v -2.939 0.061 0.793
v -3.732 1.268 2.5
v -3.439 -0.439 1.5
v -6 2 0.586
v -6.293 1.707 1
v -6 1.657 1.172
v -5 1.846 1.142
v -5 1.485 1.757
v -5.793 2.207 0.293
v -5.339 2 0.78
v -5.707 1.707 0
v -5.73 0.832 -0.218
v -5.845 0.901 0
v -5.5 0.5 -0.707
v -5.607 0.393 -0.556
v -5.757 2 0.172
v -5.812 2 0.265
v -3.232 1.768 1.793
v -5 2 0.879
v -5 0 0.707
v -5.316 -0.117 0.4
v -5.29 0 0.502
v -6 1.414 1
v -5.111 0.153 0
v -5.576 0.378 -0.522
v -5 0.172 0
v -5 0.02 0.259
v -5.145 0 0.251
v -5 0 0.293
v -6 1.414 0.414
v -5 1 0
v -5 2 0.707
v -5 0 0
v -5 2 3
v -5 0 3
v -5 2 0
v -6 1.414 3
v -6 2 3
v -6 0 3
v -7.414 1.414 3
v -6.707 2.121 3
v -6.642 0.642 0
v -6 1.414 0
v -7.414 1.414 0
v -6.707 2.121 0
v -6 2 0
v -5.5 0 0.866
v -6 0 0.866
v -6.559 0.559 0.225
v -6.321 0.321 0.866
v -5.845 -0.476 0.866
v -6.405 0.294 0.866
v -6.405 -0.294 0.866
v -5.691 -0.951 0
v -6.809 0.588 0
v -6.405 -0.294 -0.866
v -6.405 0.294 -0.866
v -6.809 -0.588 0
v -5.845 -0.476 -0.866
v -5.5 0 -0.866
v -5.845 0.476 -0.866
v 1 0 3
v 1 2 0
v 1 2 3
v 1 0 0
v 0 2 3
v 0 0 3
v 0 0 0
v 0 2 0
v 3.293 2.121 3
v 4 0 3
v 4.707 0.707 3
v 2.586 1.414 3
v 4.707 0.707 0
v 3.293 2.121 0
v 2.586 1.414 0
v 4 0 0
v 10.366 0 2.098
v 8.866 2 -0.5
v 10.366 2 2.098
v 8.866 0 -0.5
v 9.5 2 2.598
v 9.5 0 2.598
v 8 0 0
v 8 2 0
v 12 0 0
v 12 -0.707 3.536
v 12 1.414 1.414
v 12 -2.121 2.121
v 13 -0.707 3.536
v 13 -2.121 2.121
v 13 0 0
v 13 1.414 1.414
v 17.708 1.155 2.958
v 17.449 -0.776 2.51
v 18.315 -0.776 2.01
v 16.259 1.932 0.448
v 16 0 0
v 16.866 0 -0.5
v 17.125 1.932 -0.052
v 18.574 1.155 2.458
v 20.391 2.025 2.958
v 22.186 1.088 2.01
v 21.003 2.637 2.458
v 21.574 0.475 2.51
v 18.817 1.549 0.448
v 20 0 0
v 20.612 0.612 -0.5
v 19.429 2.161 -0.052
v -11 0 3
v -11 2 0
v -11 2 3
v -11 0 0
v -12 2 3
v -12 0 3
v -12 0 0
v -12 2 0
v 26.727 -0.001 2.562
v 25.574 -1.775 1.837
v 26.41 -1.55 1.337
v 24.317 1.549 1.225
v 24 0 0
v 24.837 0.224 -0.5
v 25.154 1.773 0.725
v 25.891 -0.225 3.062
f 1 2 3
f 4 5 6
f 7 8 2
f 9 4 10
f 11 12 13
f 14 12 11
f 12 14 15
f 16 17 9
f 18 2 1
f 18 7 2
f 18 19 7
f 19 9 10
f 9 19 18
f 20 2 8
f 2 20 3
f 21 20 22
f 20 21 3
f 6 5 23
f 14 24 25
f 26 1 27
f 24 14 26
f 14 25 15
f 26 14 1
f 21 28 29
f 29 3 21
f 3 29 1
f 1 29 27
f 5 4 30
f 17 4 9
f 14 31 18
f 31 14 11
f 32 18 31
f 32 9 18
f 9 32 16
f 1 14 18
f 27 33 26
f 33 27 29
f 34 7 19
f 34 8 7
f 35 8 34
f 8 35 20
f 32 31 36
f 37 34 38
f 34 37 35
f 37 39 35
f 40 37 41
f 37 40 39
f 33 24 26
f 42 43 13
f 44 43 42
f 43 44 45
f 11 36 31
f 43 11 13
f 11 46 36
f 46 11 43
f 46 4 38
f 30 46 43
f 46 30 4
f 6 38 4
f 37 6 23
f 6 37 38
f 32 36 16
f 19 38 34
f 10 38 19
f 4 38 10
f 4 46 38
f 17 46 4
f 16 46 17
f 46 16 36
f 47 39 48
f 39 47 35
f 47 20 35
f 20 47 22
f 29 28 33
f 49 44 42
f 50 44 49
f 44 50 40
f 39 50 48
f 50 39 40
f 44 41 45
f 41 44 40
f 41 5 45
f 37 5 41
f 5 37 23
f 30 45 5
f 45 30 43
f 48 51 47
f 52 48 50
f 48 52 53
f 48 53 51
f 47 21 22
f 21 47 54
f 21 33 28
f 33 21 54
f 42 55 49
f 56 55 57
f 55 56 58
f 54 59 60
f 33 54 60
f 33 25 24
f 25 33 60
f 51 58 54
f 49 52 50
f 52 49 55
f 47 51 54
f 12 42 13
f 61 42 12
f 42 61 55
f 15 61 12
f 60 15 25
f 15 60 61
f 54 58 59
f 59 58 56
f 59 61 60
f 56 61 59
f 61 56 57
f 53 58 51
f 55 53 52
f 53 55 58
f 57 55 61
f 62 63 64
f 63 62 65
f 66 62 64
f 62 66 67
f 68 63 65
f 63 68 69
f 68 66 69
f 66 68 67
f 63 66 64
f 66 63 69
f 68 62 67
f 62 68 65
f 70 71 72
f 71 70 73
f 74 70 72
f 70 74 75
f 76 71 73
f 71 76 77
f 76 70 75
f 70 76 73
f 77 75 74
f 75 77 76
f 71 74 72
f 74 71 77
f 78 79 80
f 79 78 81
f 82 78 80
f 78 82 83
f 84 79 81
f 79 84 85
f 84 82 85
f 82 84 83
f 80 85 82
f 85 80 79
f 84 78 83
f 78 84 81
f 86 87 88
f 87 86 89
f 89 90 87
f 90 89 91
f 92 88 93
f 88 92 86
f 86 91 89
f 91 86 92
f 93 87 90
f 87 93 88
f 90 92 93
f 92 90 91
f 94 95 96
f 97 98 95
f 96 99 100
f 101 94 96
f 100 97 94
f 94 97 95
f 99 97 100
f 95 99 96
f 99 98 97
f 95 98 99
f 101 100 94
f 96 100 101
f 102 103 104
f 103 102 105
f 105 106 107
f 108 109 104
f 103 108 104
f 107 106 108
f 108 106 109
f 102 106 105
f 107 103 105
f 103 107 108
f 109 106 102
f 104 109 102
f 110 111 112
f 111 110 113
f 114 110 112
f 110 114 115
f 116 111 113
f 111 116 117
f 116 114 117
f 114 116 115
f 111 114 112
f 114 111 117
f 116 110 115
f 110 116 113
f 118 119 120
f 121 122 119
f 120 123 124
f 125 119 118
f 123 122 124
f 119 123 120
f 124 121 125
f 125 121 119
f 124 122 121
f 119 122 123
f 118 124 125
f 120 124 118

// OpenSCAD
// Volume: 64.61846808544357, SurfaceArea: 226.46938432128647
s=[1,2,3];
//Fine
translate([0,0,0])
rotate(0)
cube(s);

translate([4,0,0])
rotate(45)
cube(s);

translate([8,0,0])
rotate(30,[0,1,0])
cube(s);

translate([12,0,0])
rotate([45])
cube(s);

translate([16,0,0])
rotate([15,30])
cube(s);

translate([20,0,0])
rotate([15,30,45])
cube(s);

//Edges cases
translate([-12,0,0])
{
    rotate(undef)
    rotate() //same as undef
    rotate([])
    cube(s);
}

//when deg_a is an array, the 'v' argument is ignored
translate([24,0,0])
rotate([45,30,15],v=[0,0,0])
cube(s);

//Problems with the parameters
//We mainly care that this calls create a warning
color("red")
translate([-6,0,0])
{
    rotate([45,45,45,45])
    cube(s);

    rotate()
    cube(s);

    rotate("45")
    cube(s);

    rotate(45,[0,1,0,0])
    cube(s);
    
    rotate(v=[1,0,0])
    cube(s);
    
    rotate("a","v")
    sphere();

    rotate(v="v",a="a")
    sphere();

    rotate(["a"],["v"])
    sphere();
}
